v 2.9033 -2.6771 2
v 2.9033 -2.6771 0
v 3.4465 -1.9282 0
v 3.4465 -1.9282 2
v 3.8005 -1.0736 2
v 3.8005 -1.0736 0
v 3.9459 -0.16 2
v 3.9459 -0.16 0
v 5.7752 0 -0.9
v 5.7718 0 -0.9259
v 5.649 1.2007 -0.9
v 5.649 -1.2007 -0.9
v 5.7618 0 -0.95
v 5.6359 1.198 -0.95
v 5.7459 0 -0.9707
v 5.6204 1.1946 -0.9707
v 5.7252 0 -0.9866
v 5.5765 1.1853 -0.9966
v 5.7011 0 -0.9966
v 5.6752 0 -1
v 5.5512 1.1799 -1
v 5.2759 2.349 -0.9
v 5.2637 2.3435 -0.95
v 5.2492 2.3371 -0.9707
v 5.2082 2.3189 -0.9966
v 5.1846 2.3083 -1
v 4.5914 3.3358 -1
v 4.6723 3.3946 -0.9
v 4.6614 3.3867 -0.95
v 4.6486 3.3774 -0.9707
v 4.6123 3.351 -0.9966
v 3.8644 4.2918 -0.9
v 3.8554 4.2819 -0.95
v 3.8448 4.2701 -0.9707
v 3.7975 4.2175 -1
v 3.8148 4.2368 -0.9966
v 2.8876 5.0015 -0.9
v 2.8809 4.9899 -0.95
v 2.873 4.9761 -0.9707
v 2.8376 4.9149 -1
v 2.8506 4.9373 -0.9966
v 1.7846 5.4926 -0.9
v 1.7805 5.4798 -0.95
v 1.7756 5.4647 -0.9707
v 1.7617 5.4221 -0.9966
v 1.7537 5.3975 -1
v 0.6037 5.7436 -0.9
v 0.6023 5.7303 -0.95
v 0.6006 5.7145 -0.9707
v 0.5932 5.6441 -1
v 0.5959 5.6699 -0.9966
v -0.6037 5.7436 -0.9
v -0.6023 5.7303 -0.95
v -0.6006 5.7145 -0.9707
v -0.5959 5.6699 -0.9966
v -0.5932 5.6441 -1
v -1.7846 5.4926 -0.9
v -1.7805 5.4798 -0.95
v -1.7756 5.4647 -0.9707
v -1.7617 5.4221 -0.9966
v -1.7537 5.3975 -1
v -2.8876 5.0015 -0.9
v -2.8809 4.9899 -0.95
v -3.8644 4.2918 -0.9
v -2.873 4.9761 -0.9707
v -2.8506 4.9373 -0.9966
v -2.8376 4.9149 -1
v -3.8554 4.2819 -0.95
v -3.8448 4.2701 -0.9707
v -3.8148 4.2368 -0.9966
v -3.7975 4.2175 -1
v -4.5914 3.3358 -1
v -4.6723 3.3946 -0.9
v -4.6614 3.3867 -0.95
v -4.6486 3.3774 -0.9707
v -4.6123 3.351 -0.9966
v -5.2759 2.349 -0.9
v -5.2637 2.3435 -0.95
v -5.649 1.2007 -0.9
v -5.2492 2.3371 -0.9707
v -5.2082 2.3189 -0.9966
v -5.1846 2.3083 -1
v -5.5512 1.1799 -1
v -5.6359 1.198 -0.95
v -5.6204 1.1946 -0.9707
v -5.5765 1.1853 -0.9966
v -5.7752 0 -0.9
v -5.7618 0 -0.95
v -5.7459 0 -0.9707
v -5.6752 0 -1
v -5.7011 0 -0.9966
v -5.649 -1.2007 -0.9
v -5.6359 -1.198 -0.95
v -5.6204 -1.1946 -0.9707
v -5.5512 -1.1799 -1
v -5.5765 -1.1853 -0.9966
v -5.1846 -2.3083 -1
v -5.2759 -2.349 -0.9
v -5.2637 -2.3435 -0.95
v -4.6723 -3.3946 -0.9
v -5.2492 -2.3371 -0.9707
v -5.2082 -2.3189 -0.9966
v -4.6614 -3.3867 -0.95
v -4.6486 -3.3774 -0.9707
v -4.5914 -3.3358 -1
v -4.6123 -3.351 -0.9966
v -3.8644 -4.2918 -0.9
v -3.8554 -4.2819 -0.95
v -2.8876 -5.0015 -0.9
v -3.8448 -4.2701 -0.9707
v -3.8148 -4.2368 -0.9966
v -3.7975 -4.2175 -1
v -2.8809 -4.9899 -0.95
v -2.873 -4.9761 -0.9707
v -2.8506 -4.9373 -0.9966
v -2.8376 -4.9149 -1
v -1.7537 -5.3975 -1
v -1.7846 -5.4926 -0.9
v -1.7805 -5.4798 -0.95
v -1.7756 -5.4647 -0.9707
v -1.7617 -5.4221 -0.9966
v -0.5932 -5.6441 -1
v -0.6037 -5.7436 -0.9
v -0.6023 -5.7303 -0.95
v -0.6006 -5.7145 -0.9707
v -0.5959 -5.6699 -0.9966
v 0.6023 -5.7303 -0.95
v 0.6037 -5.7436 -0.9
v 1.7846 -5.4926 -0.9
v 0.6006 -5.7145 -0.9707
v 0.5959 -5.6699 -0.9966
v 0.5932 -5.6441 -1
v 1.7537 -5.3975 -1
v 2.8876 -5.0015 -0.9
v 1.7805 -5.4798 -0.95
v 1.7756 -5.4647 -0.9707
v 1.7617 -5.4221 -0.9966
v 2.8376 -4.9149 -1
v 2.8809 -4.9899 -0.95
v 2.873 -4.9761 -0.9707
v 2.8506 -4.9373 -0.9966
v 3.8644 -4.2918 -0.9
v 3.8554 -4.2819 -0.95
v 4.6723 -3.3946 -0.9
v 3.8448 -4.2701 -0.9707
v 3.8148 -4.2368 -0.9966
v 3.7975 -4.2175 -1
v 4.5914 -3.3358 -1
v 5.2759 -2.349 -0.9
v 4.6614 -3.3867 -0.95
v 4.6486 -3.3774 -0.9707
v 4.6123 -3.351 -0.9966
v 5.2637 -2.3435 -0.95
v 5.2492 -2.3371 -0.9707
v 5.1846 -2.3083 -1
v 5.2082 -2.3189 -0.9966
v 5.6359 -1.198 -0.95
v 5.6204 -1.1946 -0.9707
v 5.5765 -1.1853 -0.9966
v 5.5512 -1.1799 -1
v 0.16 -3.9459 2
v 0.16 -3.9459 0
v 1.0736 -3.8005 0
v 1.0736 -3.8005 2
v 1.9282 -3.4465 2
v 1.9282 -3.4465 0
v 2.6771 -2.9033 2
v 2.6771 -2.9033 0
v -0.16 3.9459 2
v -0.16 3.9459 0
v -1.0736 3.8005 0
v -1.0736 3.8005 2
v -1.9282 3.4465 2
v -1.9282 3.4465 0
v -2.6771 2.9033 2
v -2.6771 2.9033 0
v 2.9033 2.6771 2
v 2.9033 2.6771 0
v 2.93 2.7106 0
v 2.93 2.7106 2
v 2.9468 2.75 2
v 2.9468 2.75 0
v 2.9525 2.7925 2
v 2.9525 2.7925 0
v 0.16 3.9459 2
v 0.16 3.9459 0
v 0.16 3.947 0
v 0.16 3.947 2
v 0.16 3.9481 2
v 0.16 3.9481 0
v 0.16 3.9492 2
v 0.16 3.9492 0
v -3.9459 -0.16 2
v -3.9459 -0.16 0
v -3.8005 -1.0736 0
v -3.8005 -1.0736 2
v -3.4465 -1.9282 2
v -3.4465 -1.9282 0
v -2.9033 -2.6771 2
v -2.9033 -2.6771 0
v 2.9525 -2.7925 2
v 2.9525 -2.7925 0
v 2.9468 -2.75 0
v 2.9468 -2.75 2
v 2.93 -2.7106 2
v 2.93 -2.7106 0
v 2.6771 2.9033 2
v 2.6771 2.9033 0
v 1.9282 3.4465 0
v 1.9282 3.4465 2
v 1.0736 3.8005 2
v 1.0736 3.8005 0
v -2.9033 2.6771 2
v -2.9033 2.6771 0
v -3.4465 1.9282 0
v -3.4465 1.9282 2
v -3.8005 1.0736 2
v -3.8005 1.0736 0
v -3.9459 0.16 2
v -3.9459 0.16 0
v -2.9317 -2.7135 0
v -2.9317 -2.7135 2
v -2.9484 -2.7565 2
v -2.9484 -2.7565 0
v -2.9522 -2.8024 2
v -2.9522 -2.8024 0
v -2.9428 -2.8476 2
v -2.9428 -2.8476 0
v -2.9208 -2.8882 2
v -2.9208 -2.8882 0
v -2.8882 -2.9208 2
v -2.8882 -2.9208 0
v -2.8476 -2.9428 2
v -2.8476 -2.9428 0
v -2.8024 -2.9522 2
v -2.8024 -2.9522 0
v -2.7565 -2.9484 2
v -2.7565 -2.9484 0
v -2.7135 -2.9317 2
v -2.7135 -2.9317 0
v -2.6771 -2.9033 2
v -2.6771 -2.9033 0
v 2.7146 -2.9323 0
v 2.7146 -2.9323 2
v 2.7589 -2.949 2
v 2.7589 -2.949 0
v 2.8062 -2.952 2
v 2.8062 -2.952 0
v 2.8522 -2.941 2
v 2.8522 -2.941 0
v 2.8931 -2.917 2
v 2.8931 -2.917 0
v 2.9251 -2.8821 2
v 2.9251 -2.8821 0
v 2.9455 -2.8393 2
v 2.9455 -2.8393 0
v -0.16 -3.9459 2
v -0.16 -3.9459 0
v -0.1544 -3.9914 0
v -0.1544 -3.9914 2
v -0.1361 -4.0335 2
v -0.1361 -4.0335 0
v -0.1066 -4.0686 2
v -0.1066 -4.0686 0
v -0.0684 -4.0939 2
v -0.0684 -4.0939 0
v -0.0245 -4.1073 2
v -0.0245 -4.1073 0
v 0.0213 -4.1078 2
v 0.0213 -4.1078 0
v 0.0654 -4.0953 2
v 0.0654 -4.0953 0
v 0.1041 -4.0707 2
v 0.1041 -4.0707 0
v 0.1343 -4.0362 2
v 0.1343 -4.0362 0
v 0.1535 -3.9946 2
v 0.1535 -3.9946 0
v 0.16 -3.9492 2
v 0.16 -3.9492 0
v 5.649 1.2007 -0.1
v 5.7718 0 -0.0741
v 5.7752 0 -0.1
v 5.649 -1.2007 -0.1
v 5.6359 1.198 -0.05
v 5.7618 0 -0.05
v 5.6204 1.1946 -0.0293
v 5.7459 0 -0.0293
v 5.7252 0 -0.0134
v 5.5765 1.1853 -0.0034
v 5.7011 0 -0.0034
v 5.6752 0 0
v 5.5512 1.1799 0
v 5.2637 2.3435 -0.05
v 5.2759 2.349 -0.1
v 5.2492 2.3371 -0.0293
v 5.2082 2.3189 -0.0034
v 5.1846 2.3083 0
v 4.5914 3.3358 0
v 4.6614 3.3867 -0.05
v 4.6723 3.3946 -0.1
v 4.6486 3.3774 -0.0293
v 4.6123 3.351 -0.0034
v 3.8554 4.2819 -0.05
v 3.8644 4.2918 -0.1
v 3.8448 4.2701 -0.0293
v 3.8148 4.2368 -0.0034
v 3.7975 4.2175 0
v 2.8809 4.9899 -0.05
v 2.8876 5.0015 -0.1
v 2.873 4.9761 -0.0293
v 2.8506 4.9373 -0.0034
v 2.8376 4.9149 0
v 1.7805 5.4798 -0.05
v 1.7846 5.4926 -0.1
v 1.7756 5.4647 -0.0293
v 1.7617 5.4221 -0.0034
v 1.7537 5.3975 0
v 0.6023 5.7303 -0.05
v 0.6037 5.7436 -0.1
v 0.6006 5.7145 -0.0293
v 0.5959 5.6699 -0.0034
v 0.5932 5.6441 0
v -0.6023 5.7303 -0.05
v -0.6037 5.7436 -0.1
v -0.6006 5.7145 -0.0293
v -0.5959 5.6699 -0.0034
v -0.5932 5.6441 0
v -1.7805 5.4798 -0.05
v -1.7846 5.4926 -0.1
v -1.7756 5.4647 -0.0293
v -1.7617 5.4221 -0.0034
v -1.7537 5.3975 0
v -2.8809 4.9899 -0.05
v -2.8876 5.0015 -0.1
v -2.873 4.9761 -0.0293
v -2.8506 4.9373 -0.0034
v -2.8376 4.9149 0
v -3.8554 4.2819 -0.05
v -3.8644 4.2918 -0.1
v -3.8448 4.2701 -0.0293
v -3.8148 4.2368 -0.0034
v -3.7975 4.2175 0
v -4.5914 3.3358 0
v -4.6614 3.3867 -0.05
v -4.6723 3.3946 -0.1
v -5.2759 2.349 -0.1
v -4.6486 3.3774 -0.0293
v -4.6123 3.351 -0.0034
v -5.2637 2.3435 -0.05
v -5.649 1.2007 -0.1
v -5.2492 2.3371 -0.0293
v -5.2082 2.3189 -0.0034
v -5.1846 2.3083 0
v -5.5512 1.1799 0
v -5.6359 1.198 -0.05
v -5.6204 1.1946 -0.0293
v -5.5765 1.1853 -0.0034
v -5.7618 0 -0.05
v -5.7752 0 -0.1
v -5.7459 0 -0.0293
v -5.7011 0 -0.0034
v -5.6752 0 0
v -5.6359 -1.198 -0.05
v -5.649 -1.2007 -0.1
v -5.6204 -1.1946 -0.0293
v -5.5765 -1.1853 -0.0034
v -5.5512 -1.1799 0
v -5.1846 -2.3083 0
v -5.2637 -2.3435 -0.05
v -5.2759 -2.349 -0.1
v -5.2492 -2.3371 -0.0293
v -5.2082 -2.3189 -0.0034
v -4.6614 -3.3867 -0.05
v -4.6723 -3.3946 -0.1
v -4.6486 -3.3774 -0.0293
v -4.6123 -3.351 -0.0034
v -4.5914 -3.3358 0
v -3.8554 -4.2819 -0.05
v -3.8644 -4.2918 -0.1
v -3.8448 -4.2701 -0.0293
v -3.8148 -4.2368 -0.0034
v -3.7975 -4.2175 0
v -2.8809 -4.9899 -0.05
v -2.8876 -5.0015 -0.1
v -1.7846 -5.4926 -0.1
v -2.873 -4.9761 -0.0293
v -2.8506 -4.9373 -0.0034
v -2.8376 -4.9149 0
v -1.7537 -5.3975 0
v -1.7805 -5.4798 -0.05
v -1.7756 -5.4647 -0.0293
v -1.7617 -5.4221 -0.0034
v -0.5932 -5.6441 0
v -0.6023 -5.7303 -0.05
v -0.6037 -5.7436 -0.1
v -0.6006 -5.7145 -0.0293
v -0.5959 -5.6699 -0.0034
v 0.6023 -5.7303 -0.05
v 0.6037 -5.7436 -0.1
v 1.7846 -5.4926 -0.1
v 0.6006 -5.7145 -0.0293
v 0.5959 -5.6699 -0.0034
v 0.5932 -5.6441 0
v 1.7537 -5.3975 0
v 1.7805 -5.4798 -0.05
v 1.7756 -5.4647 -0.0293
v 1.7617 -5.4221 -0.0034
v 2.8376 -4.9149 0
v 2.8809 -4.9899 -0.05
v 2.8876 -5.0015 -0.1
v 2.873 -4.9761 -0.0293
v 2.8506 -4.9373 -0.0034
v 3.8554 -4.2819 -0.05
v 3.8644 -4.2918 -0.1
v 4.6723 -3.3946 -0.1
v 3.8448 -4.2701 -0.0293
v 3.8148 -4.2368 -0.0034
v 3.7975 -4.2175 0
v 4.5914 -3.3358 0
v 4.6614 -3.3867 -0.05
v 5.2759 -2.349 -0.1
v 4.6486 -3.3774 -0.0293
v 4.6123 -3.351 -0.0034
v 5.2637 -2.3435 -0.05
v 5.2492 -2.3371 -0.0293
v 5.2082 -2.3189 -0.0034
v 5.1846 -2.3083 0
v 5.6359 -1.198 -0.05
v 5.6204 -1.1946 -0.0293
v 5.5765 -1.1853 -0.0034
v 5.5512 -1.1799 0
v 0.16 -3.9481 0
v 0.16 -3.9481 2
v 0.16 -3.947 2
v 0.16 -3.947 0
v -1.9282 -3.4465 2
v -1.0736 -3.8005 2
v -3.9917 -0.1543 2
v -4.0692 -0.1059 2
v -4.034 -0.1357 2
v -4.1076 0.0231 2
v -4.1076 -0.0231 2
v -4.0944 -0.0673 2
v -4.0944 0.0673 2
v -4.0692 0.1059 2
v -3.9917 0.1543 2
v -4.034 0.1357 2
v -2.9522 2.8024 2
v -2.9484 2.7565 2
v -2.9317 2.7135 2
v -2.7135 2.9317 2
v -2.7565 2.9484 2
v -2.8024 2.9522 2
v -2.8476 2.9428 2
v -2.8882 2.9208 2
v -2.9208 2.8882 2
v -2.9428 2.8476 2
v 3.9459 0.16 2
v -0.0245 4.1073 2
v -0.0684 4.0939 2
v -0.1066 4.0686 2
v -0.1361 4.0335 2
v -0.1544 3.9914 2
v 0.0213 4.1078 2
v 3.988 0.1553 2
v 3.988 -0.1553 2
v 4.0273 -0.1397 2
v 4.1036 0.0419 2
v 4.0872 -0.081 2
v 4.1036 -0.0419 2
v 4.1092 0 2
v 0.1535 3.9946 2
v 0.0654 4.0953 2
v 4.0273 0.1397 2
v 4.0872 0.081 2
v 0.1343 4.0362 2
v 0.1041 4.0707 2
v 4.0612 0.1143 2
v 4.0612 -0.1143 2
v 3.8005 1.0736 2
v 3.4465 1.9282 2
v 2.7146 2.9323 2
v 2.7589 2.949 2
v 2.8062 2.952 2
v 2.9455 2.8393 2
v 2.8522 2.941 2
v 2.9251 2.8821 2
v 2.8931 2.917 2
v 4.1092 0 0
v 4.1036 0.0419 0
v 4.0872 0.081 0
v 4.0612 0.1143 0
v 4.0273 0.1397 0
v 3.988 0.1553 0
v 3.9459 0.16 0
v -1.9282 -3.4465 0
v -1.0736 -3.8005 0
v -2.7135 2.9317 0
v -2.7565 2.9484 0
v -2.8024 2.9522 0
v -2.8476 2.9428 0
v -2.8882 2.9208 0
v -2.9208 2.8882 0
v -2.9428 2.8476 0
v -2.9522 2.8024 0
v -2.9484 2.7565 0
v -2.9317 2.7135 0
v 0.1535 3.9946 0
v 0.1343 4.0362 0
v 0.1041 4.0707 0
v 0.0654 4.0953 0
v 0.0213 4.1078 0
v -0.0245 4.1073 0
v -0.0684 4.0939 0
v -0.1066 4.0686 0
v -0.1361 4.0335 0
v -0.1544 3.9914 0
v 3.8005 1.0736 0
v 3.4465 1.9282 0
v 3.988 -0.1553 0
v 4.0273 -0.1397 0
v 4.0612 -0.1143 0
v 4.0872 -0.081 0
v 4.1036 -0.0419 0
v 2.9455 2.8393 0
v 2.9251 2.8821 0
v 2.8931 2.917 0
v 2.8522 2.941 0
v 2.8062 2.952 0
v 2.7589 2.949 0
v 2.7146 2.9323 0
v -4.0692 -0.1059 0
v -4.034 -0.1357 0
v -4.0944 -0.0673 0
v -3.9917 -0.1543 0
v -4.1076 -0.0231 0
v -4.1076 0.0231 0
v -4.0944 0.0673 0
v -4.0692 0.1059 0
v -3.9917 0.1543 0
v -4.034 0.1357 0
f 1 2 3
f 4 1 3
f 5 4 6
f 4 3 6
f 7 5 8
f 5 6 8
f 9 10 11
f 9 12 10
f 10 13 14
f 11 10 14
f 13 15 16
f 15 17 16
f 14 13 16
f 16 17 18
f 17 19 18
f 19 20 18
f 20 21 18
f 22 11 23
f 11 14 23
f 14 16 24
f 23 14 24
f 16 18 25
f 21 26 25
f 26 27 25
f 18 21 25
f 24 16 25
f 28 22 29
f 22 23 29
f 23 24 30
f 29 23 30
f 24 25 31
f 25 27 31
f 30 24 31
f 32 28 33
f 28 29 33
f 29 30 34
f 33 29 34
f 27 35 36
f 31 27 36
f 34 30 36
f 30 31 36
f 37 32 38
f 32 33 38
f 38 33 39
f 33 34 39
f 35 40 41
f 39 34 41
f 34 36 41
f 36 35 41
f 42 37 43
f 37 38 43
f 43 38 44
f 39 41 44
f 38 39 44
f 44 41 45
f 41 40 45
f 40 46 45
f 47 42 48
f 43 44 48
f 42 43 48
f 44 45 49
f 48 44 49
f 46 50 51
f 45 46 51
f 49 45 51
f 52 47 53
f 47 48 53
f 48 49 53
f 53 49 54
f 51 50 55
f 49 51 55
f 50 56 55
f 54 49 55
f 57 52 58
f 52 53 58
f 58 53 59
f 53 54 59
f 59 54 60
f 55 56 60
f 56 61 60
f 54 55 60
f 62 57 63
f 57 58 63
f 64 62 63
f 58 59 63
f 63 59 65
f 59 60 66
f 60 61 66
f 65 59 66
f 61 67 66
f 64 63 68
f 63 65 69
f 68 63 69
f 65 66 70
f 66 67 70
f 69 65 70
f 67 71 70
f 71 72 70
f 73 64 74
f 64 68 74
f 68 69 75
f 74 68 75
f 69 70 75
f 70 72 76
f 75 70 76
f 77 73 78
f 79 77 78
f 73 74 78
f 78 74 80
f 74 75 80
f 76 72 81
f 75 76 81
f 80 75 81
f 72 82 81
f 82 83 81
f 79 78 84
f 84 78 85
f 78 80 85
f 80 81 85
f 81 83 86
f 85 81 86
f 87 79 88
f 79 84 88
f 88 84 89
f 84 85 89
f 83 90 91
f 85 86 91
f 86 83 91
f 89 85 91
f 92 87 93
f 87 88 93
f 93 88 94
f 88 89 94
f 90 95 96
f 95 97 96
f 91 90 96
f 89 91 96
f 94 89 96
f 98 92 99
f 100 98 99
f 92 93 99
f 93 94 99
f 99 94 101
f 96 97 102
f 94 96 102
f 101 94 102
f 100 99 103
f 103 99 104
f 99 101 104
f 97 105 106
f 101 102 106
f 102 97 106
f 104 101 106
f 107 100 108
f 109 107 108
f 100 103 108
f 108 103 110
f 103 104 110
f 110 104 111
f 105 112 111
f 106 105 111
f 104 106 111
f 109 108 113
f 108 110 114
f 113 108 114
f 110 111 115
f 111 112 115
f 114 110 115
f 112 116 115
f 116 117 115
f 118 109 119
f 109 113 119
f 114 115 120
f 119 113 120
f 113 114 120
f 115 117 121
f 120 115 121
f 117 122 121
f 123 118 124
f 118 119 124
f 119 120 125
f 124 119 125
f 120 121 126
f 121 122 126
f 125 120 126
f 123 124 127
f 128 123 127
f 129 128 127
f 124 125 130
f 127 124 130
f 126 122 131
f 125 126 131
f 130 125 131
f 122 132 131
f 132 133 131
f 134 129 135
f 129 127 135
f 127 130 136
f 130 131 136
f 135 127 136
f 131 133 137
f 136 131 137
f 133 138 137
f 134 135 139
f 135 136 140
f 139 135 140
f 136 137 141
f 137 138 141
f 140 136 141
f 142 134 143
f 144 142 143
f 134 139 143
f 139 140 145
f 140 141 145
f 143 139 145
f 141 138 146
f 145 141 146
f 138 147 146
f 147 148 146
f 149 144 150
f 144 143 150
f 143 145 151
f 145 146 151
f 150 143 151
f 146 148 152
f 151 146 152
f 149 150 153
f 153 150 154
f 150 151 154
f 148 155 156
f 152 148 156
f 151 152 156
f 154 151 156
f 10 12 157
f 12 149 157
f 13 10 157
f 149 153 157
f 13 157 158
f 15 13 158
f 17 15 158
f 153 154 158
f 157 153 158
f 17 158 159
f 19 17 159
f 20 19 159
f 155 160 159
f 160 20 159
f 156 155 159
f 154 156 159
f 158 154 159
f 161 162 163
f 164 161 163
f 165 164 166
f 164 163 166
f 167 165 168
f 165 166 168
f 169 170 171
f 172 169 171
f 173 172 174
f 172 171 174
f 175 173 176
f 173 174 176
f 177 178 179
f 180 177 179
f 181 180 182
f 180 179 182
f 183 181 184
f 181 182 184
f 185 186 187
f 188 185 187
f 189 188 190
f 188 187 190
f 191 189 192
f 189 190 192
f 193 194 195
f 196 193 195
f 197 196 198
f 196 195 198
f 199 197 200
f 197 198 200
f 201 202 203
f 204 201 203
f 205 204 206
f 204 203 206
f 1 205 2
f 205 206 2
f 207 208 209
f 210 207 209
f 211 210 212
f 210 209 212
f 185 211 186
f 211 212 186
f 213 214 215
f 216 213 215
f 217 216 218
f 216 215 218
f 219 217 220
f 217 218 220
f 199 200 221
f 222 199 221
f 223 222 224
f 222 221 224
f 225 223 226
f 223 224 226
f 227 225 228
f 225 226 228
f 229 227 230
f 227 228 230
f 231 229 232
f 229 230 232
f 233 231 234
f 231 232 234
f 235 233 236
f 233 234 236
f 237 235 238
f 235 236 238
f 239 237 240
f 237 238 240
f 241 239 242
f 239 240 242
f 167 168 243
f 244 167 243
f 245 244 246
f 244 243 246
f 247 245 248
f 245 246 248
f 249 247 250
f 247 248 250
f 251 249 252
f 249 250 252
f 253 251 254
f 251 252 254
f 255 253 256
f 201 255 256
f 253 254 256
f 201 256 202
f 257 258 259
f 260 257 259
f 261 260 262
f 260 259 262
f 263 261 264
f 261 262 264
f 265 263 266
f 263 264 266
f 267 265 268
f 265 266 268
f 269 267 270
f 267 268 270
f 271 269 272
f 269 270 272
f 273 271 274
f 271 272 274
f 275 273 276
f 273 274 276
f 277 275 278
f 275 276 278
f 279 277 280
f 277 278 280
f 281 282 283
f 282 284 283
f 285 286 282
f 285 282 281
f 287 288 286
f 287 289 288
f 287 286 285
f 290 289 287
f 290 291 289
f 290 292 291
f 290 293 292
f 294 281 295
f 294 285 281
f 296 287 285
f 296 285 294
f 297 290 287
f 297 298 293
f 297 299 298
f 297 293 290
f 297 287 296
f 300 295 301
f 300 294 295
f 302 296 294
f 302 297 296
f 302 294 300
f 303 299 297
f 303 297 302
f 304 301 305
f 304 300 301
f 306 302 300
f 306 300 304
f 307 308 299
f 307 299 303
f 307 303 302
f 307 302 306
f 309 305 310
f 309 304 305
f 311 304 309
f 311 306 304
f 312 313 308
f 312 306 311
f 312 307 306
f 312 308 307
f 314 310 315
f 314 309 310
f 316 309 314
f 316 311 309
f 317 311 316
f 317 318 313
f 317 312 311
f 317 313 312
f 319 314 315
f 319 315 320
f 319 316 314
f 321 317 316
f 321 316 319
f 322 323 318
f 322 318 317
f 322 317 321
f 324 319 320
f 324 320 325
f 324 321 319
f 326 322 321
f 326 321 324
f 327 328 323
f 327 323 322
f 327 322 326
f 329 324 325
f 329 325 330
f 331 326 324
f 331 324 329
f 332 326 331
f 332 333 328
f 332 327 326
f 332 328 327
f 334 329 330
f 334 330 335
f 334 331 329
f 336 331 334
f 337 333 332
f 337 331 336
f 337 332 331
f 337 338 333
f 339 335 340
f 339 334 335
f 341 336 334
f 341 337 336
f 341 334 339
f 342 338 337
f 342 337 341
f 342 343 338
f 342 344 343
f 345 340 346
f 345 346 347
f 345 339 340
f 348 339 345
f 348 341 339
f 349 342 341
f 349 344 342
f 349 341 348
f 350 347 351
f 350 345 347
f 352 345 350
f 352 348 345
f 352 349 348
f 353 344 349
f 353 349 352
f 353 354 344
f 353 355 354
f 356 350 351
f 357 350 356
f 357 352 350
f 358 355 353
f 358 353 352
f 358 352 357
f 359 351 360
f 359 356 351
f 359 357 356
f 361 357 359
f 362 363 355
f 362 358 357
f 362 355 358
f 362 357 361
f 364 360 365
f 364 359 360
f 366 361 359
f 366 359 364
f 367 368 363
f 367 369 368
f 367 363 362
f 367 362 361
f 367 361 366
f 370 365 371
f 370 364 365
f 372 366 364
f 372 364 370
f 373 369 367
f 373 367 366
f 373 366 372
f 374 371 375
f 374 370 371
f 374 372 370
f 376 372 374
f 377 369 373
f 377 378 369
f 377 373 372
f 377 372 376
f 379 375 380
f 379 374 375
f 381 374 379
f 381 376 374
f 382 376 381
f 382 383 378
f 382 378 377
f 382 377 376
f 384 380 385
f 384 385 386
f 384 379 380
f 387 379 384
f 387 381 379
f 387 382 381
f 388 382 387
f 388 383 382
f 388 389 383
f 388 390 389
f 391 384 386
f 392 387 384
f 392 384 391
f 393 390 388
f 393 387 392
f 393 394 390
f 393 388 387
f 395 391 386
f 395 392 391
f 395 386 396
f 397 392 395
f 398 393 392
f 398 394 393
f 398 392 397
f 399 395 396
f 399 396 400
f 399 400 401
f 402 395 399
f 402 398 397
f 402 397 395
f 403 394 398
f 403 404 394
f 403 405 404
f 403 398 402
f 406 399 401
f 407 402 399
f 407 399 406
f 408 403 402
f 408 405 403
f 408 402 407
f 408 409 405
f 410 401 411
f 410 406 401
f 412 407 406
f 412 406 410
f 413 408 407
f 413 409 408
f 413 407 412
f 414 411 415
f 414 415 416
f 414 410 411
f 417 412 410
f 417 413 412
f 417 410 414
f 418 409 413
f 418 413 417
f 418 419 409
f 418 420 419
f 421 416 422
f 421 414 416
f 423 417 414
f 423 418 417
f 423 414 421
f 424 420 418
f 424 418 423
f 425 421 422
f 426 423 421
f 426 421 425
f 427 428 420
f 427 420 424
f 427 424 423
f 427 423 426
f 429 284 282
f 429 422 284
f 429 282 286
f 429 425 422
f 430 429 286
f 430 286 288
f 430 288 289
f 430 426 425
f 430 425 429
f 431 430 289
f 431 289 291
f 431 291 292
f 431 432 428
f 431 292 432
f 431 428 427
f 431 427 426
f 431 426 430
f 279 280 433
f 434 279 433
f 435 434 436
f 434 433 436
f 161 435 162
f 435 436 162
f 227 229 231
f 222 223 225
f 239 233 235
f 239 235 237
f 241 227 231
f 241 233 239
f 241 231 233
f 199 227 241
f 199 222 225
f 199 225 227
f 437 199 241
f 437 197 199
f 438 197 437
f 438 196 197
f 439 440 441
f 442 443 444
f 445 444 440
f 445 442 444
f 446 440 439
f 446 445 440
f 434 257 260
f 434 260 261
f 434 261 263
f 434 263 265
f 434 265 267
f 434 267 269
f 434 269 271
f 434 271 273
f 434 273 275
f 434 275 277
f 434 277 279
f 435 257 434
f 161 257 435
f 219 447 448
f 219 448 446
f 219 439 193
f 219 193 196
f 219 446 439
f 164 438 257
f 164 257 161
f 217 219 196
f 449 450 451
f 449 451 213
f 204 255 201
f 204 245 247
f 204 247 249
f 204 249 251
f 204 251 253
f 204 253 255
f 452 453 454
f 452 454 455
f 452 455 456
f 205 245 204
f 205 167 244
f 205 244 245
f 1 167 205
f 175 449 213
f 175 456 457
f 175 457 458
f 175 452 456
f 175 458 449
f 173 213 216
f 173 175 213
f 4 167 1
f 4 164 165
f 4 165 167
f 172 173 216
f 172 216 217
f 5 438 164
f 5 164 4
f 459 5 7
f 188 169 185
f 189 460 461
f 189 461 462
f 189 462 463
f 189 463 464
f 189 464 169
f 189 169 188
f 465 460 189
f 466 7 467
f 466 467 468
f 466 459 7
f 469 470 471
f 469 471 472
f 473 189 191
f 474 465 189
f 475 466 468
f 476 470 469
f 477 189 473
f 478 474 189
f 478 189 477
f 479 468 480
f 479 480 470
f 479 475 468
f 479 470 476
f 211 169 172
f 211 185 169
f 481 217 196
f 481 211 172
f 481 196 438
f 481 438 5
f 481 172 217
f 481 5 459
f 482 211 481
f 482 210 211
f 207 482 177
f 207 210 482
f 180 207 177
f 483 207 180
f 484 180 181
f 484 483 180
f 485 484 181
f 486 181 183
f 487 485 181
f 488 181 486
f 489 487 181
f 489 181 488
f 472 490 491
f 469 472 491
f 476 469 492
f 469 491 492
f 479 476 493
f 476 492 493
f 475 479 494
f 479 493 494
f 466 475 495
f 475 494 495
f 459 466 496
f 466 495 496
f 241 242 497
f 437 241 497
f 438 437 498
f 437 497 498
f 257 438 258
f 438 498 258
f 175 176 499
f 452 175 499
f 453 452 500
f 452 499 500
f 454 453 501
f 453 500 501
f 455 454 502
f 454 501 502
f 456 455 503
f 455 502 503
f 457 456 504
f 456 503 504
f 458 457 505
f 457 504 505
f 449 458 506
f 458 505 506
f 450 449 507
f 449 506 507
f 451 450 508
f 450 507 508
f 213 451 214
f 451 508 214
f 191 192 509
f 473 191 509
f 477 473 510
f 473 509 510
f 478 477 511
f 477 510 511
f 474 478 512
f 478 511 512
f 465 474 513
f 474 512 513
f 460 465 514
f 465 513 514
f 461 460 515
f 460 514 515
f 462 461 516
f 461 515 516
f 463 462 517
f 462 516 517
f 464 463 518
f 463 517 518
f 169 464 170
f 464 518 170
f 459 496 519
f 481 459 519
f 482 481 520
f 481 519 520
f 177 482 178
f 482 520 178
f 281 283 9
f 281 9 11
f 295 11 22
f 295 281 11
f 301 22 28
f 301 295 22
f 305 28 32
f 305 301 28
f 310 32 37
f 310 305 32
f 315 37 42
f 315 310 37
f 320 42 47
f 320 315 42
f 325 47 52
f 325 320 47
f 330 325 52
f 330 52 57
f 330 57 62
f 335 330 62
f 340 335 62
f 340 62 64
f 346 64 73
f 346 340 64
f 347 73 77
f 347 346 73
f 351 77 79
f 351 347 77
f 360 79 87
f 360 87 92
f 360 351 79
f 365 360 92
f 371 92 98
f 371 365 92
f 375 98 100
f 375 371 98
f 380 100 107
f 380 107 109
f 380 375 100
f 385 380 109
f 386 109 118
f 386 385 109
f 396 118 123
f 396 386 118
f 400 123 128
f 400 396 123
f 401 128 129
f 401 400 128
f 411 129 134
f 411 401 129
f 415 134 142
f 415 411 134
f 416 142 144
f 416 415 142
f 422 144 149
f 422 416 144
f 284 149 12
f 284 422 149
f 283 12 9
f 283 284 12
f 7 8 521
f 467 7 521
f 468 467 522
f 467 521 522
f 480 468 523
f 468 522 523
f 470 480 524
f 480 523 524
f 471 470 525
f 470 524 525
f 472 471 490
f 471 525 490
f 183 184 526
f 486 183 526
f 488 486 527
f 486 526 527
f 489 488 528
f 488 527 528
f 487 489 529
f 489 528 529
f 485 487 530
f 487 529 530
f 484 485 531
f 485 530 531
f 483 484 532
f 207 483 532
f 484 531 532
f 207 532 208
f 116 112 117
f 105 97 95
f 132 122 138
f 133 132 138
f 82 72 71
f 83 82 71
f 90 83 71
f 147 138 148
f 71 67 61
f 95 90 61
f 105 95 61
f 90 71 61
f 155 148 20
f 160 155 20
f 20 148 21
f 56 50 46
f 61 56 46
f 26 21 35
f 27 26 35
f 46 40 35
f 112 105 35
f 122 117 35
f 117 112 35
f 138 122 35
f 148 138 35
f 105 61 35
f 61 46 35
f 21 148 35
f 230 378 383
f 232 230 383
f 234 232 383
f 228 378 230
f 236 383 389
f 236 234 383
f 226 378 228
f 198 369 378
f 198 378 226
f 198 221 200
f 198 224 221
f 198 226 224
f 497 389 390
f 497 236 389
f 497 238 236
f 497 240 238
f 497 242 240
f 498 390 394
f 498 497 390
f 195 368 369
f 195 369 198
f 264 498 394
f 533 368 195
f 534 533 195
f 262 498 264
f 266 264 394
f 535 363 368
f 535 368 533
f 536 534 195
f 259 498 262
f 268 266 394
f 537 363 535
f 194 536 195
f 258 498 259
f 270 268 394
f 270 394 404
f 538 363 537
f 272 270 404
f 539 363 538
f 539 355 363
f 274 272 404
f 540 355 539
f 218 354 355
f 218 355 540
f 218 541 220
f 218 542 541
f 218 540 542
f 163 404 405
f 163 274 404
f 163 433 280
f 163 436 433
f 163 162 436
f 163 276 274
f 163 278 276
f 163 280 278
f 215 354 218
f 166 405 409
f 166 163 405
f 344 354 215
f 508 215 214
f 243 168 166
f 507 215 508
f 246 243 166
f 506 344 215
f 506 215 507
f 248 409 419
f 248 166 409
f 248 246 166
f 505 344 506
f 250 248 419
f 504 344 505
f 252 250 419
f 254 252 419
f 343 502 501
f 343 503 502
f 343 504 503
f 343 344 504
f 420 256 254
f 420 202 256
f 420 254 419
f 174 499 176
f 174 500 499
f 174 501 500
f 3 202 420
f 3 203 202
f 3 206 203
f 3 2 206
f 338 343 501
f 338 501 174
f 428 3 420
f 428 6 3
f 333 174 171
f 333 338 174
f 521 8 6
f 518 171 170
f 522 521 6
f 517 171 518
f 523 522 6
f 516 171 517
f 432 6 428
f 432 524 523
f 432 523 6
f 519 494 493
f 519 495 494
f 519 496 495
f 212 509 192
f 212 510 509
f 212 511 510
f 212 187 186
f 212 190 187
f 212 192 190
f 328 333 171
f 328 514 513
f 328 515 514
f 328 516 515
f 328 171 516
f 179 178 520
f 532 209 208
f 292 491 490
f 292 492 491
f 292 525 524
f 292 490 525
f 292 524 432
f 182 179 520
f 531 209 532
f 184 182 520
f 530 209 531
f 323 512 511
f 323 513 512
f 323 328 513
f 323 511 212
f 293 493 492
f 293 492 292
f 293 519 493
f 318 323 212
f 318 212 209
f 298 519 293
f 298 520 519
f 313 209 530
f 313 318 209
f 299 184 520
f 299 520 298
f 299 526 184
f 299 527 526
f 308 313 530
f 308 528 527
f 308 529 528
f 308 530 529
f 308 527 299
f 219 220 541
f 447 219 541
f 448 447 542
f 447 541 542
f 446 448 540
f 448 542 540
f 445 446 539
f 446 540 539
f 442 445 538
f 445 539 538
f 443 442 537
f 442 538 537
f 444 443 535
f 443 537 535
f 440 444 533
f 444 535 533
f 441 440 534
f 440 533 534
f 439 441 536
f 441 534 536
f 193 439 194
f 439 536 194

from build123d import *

# Parameters (mm, degrees)
F0_R     = 5.7752276128
F1_DEPTH = 1
F2_DEPTH = 2
F3_R     = 0.1


with BuildPart() as f1:
    # F0 (on Top) → F1 (new body)
    with BuildSketch(Plane.XY):
        Circle(F0_R)
        with BuildLine():
            ThreePointArc((2.9033493644, 2.6770525323), (3.6485695105, 1.5112869745), (3.9459400229, 0.1600160246))
            ThreePointArc((3.9459400229, 0.1600160246), (4.061202336, 0.114312532), (4.1092320673, 0))
            ThreePointArc((4.1092320673, 0), (4.061202336, -0.114312532), (3.9459400229, -0.1600160246))
            ThreePointArc((3.9459400229, -0.1600160246), (3.6485695105, -1.5112869745), (2.9033493644, -2.6770525323))
            ThreePointArc((2.9033493644, -2.6770525323), (2.9397319242, -2.7297510734), (2.9525430939, -2.792494207))
            ThreePointArc((2.9525430939, -2.792494207), (2.8522409, -2.9409730906), (2.6770525323, -2.9033493644))
            ThreePointArc((2.6770525323, -2.9033493644), (1.5112869745, -3.6485695105), (0.1600160246, -3.9459400229))
            ThreePointArc((0.1600160246, -3.9459400229), (0.1600406711, -3.9475615184), (0.1600488869, -3.9491831804))
            ThreePointArc((0.1600488869, -3.9491831804), (-0.001621662, -4.1092238515), (-0.1600160246, -3.9459400229))
            ThreePointArc((-0.1600160246, -3.9459400229), (-1.5112869745, -3.6485695105), (-2.6770525323, -2.9033493644))
            ThreePointArc((-2.6770525323, -2.9033493644), (-2.9056658603, -2.9056658603), (-2.9033493644, -2.6770525323))
            ThreePointArc((-2.9033493644, -2.6770525323), (-3.6485695105, -1.5112869745), (-3.9459400229, -0.1600160246))
            ThreePointArc((-3.9459400229, -0.1600160246), (-4.1092320673, 0), (-3.9459400229, 0.1600160246))
            ThreePointArc((-3.9459400229, 0.1600160246), (-3.6485695105, 1.5112869745), (-2.9033493644, 2.6770525323))
            ThreePointArc((-2.9033493644, 2.6770525323), (-2.9056658603, 2.9056658603), (-2.6770525323, 2.9033493644))
            ThreePointArc((-2.6770525323, 2.9033493644), (-1.5112869745, 3.6485695105), (-0.1600160246, 3.9459400229))
            ThreePointArc((-0.1600160246, 3.9459400229), (-0.001621662, 4.1092238515), (0.1600488869, 3.9491831804))
            ThreePointArc((0.1600488869, 3.9491831804), (0.1600406711, 3.9475615184), (0.1600160246, 3.9459400229))
            ThreePointArc((0.1600160246, 3.9459400229), (1.5112869745, 3.6485695105), (2.6770525323, 2.9033493644))
            ThreePointArc((2.6770525323, 2.9033493644), (2.8522409, 2.9409730906), (2.9525430939, 2.792494207))
            ThreePointArc((2.9525430939, 2.792494207), (2.9397319242, 2.7297510734), (2.9033493644, 2.6770525323))
        make_face(mode=Mode.SUBTRACT)
        with BuildLine():
            ThreePointArc((3.9459400229, -0.1600160246), (3.7891342935, 0), (3.9459400229, 0.1600160246))
            ThreePointArc((3.9459400229, 0.1600160246), (3.6485695105, 1.5112869745), (2.9033493644, 2.6770525323))
            ThreePointArc((2.9033493644, 2.6770525323), (2.6793225538, 2.6793225538), (2.6770525323, 2.9033493644))
            ThreePointArc((2.6770525323, 2.9033493644), (1.5112869745, 3.6485695105), (0.1600160246, 3.9459400229))
            ThreePointArc((0.1600160246, 3.9459400229), (0, 3.7891342935), (-0.1600160246, 3.9459400229))
            ThreePointArc((-0.1600160246, 3.9459400229), (-1.5112869745, 3.6485695105), (-2.6770525323, 2.9033493644))
            ThreePointArc((-2.6770525323, 2.9033493644), (-2.6440153234, 2.8522409), (-2.6324453201, 2.792494207))
            ThreePointArc((-2.6324453201, 2.792494207), (-2.7297510734, 2.6452564898), (-2.9033493644, 2.6770525323))
            ThreePointArc((-2.9033493644, 2.6770525323), (-3.6485695105, 1.5112869745), (-3.9459400229, 0.1600160246))
            ThreePointArc((-3.9459400229, 0.1600160246), (-3.8348706484, 0.1120191556), (-3.7891342935, 0))
            ThreePointArc((-3.7891342935, 0), (-3.8348706484, -0.1120191556), (-3.9459400229, -0.1600160246))
            ThreePointArc((-3.9459400229, -0.1600160246), (-3.6485695105, -1.5112869745), (-2.9033493644, -2.6770525323))
            ThreePointArc((-2.9033493644, -2.6770525323), (-2.7297510734, -2.6452564898), (-2.6324453201, -2.792494207))
            ThreePointArc((-2.6324453201, -2.792494207), (-2.6440153234, -2.8522409), (-2.6770525323, -2.9033493644))
            ThreePointArc((-2.6770525323, -2.9033493644), (-1.5112869745, -3.6485695105), (-0.1600160246, -3.9459400229))
            ThreePointArc((-0.1600160246, -3.9459400229), (0, -3.7891342935), (0.1600160246, -3.9459400229))
            ThreePointArc((0.1600160246, -3.9459400229), (1.5112869745, -3.6485695105), (2.6770525323, -2.9033493644))
            ThreePointArc((2.6770525323, -2.9033493644), (2.6793225538, -2.6793225538), (2.9033493644, -2.6770525323))
            ThreePointArc((2.9033493644, -2.6770525323), (3.6485695105, -1.5112869745), (3.9459400229, -0.1600160246))
        make_face()
        with BuildLine():
            ThreePointArc((-3.9459400229, -0.1600160246), (-3.9491831804, 0), (-3.9459400229, 0.1600160246))
            ThreePointArc((-3.9459400229, 0.1600160246), (-4.1092320673, 0), (-3.9459400229, -0.1600160246))
        make_face()
        with BuildLine():
            ThreePointArc((-2.9033493644, -2.6770525323), (-2.9056658603, -2.9056658603), (-2.6770525323, -2.9033493644))
            ThreePointArc((-2.6770525323, -2.9033493644), (-2.792494207, -2.792494207), (-2.9033493644, -2.6770525323))
        make_face()
        with BuildLine():
            ThreePointArc((-2.9033493644, 2.6770525323), (-2.792494207, 2.792494207), (-2.6770525323, 2.9033493644))
            ThreePointArc((-2.6770525323, 2.9033493644), (-2.9056658603, 2.9056658603), (-2.9033493644, 2.6770525323))
        make_face()
        with BuildLine():
            ThreePointArc((3.9459400229, 0.1600160246), (3.9483723078, 0.0800244434), (3.9491831804, 0))
            ThreePointArc((3.9491831804, 0), (3.9483723078, -0.0800244434), (3.9459400229, -0.1600160246))
            ThreePointArc((3.9459400229, -0.1600160246), (4.061202336, -0.114312532), (4.1092320673, 0))
            ThreePointArc((4.1092320673, 0), (4.061202336, 0.114312532), (3.9459400229, 0.1600160246))
        make_face()
        with BuildLine():
            ThreePointArc((2.9525430939, -2.792494207), (2.9397319242, -2.7297510734), (2.9033493644, -2.6770525323))
            ThreePointArc((2.9033493644, -2.6770525323), (2.792494207, -2.792494207), (2.6770525323, -2.9033493644))
            ThreePointArc((2.6770525323, -2.9033493644), (2.8522409, -2.9409730906), (2.9525430939, -2.792494207))
        make_face()
        with BuildLine():
            ThreePointArc((0.1600488869, -3.9491831804), (0.1600406711, -3.9475615184), (0.1600160246, -3.9459400229))
            ThreePointArc((0.1600160246, -3.9459400229), (0, -3.9491831804), (-0.1600160246, -3.9459400229))
            ThreePointArc((-0.1600160246, -3.9459400229), (-0.001621662, -4.1092238515), (0.1600488869, -3.9491831804))
        make_face()
        with BuildLine():
            ThreePointArc((2.6770525323, 2.9033493644), (2.792494207, 2.792494207), (2.9033493644, 2.6770525323))
            ThreePointArc((2.9033493644, 2.6770525323), (2.9397319242, 2.7297510734), (2.9525430939, 2.792494207))
            ThreePointArc((2.9525430939, 2.792494207), (2.8522409, 2.9409730906), (2.6770525323, 2.9033493644))
        make_face()
        with BuildLine():
            ThreePointArc((-0.1600160246, 3.9459400229), (0, 3.9491831804), (0.1600160246, 3.9459400229))
            ThreePointArc((0.1600160246, 3.9459400229), (0.1600406711, 3.9475615184), (0.1600488869, 3.9491831804))
            ThreePointArc((0.1600488869, 3.9491831804), (-0.001621662, 4.1092238515), (-0.1600160246, 3.9459400229))
        make_face()
        with BuildLine():
            ThreePointArc((-3.7891342935, 0), (-3.8348706484, 0.1120191556), (-3.9459400229, 0.1600160246))
            ThreePointArc((-3.9459400229, 0.1600160246), (-3.9491831804, 0), (-3.9459400229, -0.1600160246))
            ThreePointArc((-3.9459400229, -0.1600160246), (-3.8348706484, -0.1120191556), (-3.7891342935, 0))
        make_face()
        with BuildLine():
            ThreePointArc((-2.9033493644, -2.6770525323), (-2.792494207, -2.792494207), (-2.6770525323, -2.9033493644))
            ThreePointArc((-2.6770525323, -2.9033493644), (-2.6440153234, -2.8522409), (-2.6324453201, -2.792494207))
            ThreePointArc((-2.6324453201, -2.792494207), (-2.7297510734, -2.6452564898), (-2.9033493644, -2.6770525323))
        make_face()
        with BuildLine():
            ThreePointArc((-2.6324453201, 2.792494207), (-2.6440153234, 2.8522409), (-2.6770525323, 2.9033493644))
            ThreePointArc((-2.6770525323, 2.9033493644), (-2.792494207, 2.792494207), (-2.9033493644, 2.6770525323))
            ThreePointArc((-2.9033493644, 2.6770525323), (-2.7297510734, 2.6452564898), (-2.6324453201, 2.792494207))
        make_face()
        with BuildLine():
            ThreePointArc((3.9459400229, -0.1600160246), (3.9483723078, -0.0800244434), (3.9491831804, 0))
            ThreePointArc((3.9491831804, 0), (3.9483723078, 0.0800244434), (3.9459400229, 0.1600160246))
            ThreePointArc((3.9459400229, 0.1600160246), (3.7891342935, 0), (3.9459400229, -0.1600160246))
        make_face()
        with BuildLine():
            ThreePointArc((2.6770525323, -2.9033493644), (2.792494207, -2.792494207), (2.9033493644, -2.6770525323))
            ThreePointArc((2.9033493644, -2.6770525323), (2.6793225538, -2.6793225538), (2.6770525323, -2.9033493644))
        make_face()
        with BuildLine():
            ThreePointArc((-0.1600160246, -3.9459400229), (0, -3.9491831804), (0.1600160246, -3.9459400229))
            ThreePointArc((0.1600160246, -3.9459400229), (0, -3.7891342935), (-0.1600160246, -3.9459400229))
        make_face()
        with BuildLine():
            ThreePointArc((2.6770525323, 2.9033493644), (2.6793225538, 2.6793225538), (2.9033493644, 2.6770525323))
            ThreePointArc((2.9033493644, 2.6770525323), (2.792494207, 2.792494207), (2.6770525323, 2.9033493644))
        make_face()
        with BuildLine():
            ThreePointArc((-0.1600160246, 3.9459400229), (0, 3.7891342935), (0.1600160246, 3.9459400229))
            ThreePointArc((0.1600160246, 3.9459400229), (0, 3.9491831804), (-0.1600160246, 3.9459400229))
        make_face()
    extrude(amount=-F1_DEPTH)

    # F0 (on Top) → F2 (join)
    with BuildSketch(Plane.XY):
        with BuildLine():
            ThreePointArc((3.9459400229, -0.1600160246), (3.7891342935, 0), (3.9459400229, 0.1600160246))
            ThreePointArc((3.9459400229, 0.1600160246), (3.6485695105, 1.5112869745), (2.9033493644, 2.6770525323))
            ThreePointArc((2.9033493644, 2.6770525323), (2.6793225538, 2.6793225538), (2.6770525323, 2.9033493644))
            ThreePointArc((2.6770525323, 2.9033493644), (1.5112869745, 3.6485695105), (0.1600160246, 3.9459400229))
            ThreePointArc((0.1600160246, 3.9459400229), (0, 3.7891342935), (-0.1600160246, 3.9459400229))
            ThreePointArc((-0.1600160246, 3.9459400229), (-1.5112869745, 3.6485695105), (-2.6770525323, 2.9033493644))
            ThreePointArc((-2.6770525323, 2.9033493644), (-2.6440153234, 2.8522409), (-2.6324453201, 2.792494207))
            ThreePointArc((-2.6324453201, 2.792494207), (-2.7297510734, 2.6452564898), (-2.9033493644, 2.6770525323))
            ThreePointArc((-2.9033493644, 2.6770525323), (-3.6485695105, 1.5112869745), (-3.9459400229, 0.1600160246))
            ThreePointArc((-3.9459400229, 0.1600160246), (-3.8348706484, 0.1120191556), (-3.7891342935, 0))
            ThreePointArc((-3.7891342935, 0), (-3.8348706484, -0.1120191556), (-3.9459400229, -0.1600160246))
            ThreePointArc((-3.9459400229, -0.1600160246), (-3.6485695105, -1.5112869745), (-2.9033493644, -2.6770525323))
            ThreePointArc((-2.9033493644, -2.6770525323), (-2.7297510734, -2.6452564898), (-2.6324453201, -2.792494207))
            ThreePointArc((-2.6324453201, -2.792494207), (-2.6440153234, -2.8522409), (-2.6770525323, -2.9033493644))
            ThreePointArc((-2.6770525323, -2.9033493644), (-1.5112869745, -3.6485695105), (-0.1600160246, -3.9459400229))
            ThreePointArc((-0.1600160246, -3.9459400229), (0, -3.7891342935), (0.1600160246, -3.9459400229))
            ThreePointArc((0.1600160246, -3.9459400229), (1.5112869745, -3.6485695105), (2.6770525323, -2.9033493644))
            ThreePointArc((2.6770525323, -2.9033493644), (2.6793225538, -2.6793225538), (2.9033493644, -2.6770525323))
            ThreePointArc((2.9033493644, -2.6770525323), (3.6485695105, -1.5112869745), (3.9459400229, -0.1600160246))
        make_face()
        with BuildLine():
            ThreePointArc((-2.6324453201, 2.792494207), (-2.6440153234, 2.8522409), (-2.6770525323, 2.9033493644))
            ThreePointArc((-2.6770525323, 2.9033493644), (-2.792494207, 2.792494207), (-2.9033493644, 2.6770525323))
            ThreePointArc((-2.9033493644, 2.6770525323), (-2.7297510734, 2.6452564898), (-2.6324453201, 2.792494207))
        make_face()
        with BuildLine():
            ThreePointArc((-2.9033493644, 2.6770525323), (-2.792494207, 2.792494207), (-2.6770525323, 2.9033493644))
            ThreePointArc((-2.6770525323, 2.9033493644), (-2.9056658603, 2.9056658603), (-2.9033493644, 2.6770525323))
        make_face()
        with BuildLine():
            ThreePointArc((-3.9459400229, -0.1600160246), (-3.9491831804, 0), (-3.9459400229, 0.1600160246))
            ThreePointArc((-3.9459400229, 0.1600160246), (-4.1092320673, 0), (-3.9459400229, -0.1600160246))
        make_face()
        with BuildLine():
            ThreePointArc((-3.7891342935, 0), (-3.8348706484, 0.1120191556), (-3.9459400229, 0.1600160246))
            ThreePointArc((-3.9459400229, 0.1600160246), (-3.9491831804, 0), (-3.9459400229, -0.1600160246))
            ThreePointArc((-3.9459400229, -0.1600160246), (-3.8348706484, -0.1120191556), (-3.7891342935, 0))
        make_face()
        with BuildLine():
            ThreePointArc((-2.9033493644, -2.6770525323), (-2.9056658603, -2.9056658603), (-2.6770525323, -2.9033493644))
            ThreePointArc((-2.6770525323, -2.9033493644), (-2.792494207, -2.792494207), (-2.9033493644, -2.6770525323))
        make_face()
        with BuildLine():
            ThreePointArc((-2.9033493644, -2.6770525323), (-2.792494207, -2.792494207), (-2.6770525323, -2.9033493644))
            ThreePointArc((-2.6770525323, -2.9033493644), (-2.6440153234, -2.8522409), (-2.6324453201, -2.792494207))
            ThreePointArc((-2.6324453201, -2.792494207), (-2.7297510734, -2.6452564898), (-2.9033493644, -2.6770525323))
        make_face()
        with BuildLine():
            ThreePointArc((0.1600488869, -3.9491831804), (0.1600406711, -3.9475615184), (0.1600160246, -3.9459400229))
            ThreePointArc((0.1600160246, -3.9459400229), (0, -3.9491831804), (-0.1600160246, -3.9459400229))
            ThreePointArc((-0.1600160246, -3.9459400229), (-0.001621662, -4.1092238515), (0.1600488869, -3.9491831804))
        make_face()
        with BuildLine():
            ThreePointArc((-0.1600160246, -3.9459400229), (0, -3.9491831804), (0.1600160246, -3.9459400229))
            ThreePointArc((0.1600160246, -3.9459400229), (0, -3.7891342935), (-0.1600160246, -3.9459400229))
        make_face()
        with BuildLine():
            ThreePointArc((2.9525430939, -2.792494207), (2.9397319242, -2.7297510734), (2.9033493644, -2.6770525323))
            ThreePointArc((2.9033493644, -2.6770525323), (2.792494207, -2.792494207), (2.6770525323, -2.9033493644))
            ThreePointArc((2.6770525323, -2.9033493644), (2.8522409, -2.9409730906), (2.9525430939, -2.792494207))
        make_face()
        with BuildLine():
            ThreePointArc((2.6770525323, -2.9033493644), (2.792494207, -2.792494207), (2.9033493644, -2.6770525323))
            ThreePointArc((2.9033493644, -2.6770525323), (2.6793225538, -2.6793225538), (2.6770525323, -2.9033493644))
        make_face()
        with BuildLine():
            ThreePointArc((3.9459400229, -0.1600160246), (3.9483723078, -0.0800244434), (3.9491831804, 0))
            ThreePointArc((3.9491831804, 0), (3.9483723078, 0.0800244434), (3.9459400229, 0.1600160246))
            ThreePointArc((3.9459400229, 0.1600160246), (3.7891342935, 0), (3.9459400229, -0.1600160246))
        make_face()
        with BuildLine():
            ThreePointArc((3.9459400229, 0.1600160246), (3.9483723078, 0.0800244434), (3.9491831804, 0))
            ThreePointArc((3.9491831804, 0), (3.9483723078, -0.0800244434), (3.9459400229, -0.1600160246))
            ThreePointArc((3.9459400229, -0.1600160246), (4.061202336, -0.114312532), (4.1092320673, 0))
            ThreePointArc((4.1092320673, 0), (4.061202336, 0.114312532), (3.9459400229, 0.1600160246))
        make_face()
        with BuildLine():
            ThreePointArc((-0.1600160246, 3.9459400229), (0, 3.9491831804), (0.1600160246, 3.9459400229))
            ThreePointArc((0.1600160246, 3.9459400229), (0.1600406711, 3.9475615184), (0.1600488869, 3.9491831804))
            ThreePointArc((0.1600488869, 3.9491831804), (-0.001621662, 4.1092238515), (-0.1600160246, 3.9459400229))
        make_face()
        with BuildLine():
            ThreePointArc((-0.1600160246, 3.9459400229), (0, 3.7891342935), (0.1600160246, 3.9459400229))
            ThreePointArc((0.1600160246, 3.9459400229), (0, 3.9491831804), (-0.1600160246, 3.9459400229))
        make_face()
        with BuildLine():
            ThreePointArc((2.6770525323, 2.9033493644), (2.6793225538, 2.6793225538), (2.9033493644, 2.6770525323))
            ThreePointArc((2.9033493644, 2.6770525323), (2.792494207, 2.792494207), (2.6770525323, 2.9033493644))
        make_face()
        with BuildLine():
            ThreePointArc((2.6770525323, 2.9033493644), (2.792494207, 2.792494207), (2.9033493644, 2.6770525323))
            ThreePointArc((2.9033493644, 2.6770525323), (2.9397319242, 2.7297510734), (2.9525430939, 2.792494207))
            ThreePointArc((2.9525430939, 2.792494207), (2.8522409, 2.9409730906), (2.6770525323, 2.9033493644))
        make_face()
    extrude(amount=F2_DEPTH)

    # F3
    f3_edges = [f1.edges().sort_by_distance(p)[0] for p in [
        (-5.775228, 0, -1),
        (-5.775228, 0, 0),
    ]]
    fillet(f3_edges, radius=F3_R)


solid = f1.part
